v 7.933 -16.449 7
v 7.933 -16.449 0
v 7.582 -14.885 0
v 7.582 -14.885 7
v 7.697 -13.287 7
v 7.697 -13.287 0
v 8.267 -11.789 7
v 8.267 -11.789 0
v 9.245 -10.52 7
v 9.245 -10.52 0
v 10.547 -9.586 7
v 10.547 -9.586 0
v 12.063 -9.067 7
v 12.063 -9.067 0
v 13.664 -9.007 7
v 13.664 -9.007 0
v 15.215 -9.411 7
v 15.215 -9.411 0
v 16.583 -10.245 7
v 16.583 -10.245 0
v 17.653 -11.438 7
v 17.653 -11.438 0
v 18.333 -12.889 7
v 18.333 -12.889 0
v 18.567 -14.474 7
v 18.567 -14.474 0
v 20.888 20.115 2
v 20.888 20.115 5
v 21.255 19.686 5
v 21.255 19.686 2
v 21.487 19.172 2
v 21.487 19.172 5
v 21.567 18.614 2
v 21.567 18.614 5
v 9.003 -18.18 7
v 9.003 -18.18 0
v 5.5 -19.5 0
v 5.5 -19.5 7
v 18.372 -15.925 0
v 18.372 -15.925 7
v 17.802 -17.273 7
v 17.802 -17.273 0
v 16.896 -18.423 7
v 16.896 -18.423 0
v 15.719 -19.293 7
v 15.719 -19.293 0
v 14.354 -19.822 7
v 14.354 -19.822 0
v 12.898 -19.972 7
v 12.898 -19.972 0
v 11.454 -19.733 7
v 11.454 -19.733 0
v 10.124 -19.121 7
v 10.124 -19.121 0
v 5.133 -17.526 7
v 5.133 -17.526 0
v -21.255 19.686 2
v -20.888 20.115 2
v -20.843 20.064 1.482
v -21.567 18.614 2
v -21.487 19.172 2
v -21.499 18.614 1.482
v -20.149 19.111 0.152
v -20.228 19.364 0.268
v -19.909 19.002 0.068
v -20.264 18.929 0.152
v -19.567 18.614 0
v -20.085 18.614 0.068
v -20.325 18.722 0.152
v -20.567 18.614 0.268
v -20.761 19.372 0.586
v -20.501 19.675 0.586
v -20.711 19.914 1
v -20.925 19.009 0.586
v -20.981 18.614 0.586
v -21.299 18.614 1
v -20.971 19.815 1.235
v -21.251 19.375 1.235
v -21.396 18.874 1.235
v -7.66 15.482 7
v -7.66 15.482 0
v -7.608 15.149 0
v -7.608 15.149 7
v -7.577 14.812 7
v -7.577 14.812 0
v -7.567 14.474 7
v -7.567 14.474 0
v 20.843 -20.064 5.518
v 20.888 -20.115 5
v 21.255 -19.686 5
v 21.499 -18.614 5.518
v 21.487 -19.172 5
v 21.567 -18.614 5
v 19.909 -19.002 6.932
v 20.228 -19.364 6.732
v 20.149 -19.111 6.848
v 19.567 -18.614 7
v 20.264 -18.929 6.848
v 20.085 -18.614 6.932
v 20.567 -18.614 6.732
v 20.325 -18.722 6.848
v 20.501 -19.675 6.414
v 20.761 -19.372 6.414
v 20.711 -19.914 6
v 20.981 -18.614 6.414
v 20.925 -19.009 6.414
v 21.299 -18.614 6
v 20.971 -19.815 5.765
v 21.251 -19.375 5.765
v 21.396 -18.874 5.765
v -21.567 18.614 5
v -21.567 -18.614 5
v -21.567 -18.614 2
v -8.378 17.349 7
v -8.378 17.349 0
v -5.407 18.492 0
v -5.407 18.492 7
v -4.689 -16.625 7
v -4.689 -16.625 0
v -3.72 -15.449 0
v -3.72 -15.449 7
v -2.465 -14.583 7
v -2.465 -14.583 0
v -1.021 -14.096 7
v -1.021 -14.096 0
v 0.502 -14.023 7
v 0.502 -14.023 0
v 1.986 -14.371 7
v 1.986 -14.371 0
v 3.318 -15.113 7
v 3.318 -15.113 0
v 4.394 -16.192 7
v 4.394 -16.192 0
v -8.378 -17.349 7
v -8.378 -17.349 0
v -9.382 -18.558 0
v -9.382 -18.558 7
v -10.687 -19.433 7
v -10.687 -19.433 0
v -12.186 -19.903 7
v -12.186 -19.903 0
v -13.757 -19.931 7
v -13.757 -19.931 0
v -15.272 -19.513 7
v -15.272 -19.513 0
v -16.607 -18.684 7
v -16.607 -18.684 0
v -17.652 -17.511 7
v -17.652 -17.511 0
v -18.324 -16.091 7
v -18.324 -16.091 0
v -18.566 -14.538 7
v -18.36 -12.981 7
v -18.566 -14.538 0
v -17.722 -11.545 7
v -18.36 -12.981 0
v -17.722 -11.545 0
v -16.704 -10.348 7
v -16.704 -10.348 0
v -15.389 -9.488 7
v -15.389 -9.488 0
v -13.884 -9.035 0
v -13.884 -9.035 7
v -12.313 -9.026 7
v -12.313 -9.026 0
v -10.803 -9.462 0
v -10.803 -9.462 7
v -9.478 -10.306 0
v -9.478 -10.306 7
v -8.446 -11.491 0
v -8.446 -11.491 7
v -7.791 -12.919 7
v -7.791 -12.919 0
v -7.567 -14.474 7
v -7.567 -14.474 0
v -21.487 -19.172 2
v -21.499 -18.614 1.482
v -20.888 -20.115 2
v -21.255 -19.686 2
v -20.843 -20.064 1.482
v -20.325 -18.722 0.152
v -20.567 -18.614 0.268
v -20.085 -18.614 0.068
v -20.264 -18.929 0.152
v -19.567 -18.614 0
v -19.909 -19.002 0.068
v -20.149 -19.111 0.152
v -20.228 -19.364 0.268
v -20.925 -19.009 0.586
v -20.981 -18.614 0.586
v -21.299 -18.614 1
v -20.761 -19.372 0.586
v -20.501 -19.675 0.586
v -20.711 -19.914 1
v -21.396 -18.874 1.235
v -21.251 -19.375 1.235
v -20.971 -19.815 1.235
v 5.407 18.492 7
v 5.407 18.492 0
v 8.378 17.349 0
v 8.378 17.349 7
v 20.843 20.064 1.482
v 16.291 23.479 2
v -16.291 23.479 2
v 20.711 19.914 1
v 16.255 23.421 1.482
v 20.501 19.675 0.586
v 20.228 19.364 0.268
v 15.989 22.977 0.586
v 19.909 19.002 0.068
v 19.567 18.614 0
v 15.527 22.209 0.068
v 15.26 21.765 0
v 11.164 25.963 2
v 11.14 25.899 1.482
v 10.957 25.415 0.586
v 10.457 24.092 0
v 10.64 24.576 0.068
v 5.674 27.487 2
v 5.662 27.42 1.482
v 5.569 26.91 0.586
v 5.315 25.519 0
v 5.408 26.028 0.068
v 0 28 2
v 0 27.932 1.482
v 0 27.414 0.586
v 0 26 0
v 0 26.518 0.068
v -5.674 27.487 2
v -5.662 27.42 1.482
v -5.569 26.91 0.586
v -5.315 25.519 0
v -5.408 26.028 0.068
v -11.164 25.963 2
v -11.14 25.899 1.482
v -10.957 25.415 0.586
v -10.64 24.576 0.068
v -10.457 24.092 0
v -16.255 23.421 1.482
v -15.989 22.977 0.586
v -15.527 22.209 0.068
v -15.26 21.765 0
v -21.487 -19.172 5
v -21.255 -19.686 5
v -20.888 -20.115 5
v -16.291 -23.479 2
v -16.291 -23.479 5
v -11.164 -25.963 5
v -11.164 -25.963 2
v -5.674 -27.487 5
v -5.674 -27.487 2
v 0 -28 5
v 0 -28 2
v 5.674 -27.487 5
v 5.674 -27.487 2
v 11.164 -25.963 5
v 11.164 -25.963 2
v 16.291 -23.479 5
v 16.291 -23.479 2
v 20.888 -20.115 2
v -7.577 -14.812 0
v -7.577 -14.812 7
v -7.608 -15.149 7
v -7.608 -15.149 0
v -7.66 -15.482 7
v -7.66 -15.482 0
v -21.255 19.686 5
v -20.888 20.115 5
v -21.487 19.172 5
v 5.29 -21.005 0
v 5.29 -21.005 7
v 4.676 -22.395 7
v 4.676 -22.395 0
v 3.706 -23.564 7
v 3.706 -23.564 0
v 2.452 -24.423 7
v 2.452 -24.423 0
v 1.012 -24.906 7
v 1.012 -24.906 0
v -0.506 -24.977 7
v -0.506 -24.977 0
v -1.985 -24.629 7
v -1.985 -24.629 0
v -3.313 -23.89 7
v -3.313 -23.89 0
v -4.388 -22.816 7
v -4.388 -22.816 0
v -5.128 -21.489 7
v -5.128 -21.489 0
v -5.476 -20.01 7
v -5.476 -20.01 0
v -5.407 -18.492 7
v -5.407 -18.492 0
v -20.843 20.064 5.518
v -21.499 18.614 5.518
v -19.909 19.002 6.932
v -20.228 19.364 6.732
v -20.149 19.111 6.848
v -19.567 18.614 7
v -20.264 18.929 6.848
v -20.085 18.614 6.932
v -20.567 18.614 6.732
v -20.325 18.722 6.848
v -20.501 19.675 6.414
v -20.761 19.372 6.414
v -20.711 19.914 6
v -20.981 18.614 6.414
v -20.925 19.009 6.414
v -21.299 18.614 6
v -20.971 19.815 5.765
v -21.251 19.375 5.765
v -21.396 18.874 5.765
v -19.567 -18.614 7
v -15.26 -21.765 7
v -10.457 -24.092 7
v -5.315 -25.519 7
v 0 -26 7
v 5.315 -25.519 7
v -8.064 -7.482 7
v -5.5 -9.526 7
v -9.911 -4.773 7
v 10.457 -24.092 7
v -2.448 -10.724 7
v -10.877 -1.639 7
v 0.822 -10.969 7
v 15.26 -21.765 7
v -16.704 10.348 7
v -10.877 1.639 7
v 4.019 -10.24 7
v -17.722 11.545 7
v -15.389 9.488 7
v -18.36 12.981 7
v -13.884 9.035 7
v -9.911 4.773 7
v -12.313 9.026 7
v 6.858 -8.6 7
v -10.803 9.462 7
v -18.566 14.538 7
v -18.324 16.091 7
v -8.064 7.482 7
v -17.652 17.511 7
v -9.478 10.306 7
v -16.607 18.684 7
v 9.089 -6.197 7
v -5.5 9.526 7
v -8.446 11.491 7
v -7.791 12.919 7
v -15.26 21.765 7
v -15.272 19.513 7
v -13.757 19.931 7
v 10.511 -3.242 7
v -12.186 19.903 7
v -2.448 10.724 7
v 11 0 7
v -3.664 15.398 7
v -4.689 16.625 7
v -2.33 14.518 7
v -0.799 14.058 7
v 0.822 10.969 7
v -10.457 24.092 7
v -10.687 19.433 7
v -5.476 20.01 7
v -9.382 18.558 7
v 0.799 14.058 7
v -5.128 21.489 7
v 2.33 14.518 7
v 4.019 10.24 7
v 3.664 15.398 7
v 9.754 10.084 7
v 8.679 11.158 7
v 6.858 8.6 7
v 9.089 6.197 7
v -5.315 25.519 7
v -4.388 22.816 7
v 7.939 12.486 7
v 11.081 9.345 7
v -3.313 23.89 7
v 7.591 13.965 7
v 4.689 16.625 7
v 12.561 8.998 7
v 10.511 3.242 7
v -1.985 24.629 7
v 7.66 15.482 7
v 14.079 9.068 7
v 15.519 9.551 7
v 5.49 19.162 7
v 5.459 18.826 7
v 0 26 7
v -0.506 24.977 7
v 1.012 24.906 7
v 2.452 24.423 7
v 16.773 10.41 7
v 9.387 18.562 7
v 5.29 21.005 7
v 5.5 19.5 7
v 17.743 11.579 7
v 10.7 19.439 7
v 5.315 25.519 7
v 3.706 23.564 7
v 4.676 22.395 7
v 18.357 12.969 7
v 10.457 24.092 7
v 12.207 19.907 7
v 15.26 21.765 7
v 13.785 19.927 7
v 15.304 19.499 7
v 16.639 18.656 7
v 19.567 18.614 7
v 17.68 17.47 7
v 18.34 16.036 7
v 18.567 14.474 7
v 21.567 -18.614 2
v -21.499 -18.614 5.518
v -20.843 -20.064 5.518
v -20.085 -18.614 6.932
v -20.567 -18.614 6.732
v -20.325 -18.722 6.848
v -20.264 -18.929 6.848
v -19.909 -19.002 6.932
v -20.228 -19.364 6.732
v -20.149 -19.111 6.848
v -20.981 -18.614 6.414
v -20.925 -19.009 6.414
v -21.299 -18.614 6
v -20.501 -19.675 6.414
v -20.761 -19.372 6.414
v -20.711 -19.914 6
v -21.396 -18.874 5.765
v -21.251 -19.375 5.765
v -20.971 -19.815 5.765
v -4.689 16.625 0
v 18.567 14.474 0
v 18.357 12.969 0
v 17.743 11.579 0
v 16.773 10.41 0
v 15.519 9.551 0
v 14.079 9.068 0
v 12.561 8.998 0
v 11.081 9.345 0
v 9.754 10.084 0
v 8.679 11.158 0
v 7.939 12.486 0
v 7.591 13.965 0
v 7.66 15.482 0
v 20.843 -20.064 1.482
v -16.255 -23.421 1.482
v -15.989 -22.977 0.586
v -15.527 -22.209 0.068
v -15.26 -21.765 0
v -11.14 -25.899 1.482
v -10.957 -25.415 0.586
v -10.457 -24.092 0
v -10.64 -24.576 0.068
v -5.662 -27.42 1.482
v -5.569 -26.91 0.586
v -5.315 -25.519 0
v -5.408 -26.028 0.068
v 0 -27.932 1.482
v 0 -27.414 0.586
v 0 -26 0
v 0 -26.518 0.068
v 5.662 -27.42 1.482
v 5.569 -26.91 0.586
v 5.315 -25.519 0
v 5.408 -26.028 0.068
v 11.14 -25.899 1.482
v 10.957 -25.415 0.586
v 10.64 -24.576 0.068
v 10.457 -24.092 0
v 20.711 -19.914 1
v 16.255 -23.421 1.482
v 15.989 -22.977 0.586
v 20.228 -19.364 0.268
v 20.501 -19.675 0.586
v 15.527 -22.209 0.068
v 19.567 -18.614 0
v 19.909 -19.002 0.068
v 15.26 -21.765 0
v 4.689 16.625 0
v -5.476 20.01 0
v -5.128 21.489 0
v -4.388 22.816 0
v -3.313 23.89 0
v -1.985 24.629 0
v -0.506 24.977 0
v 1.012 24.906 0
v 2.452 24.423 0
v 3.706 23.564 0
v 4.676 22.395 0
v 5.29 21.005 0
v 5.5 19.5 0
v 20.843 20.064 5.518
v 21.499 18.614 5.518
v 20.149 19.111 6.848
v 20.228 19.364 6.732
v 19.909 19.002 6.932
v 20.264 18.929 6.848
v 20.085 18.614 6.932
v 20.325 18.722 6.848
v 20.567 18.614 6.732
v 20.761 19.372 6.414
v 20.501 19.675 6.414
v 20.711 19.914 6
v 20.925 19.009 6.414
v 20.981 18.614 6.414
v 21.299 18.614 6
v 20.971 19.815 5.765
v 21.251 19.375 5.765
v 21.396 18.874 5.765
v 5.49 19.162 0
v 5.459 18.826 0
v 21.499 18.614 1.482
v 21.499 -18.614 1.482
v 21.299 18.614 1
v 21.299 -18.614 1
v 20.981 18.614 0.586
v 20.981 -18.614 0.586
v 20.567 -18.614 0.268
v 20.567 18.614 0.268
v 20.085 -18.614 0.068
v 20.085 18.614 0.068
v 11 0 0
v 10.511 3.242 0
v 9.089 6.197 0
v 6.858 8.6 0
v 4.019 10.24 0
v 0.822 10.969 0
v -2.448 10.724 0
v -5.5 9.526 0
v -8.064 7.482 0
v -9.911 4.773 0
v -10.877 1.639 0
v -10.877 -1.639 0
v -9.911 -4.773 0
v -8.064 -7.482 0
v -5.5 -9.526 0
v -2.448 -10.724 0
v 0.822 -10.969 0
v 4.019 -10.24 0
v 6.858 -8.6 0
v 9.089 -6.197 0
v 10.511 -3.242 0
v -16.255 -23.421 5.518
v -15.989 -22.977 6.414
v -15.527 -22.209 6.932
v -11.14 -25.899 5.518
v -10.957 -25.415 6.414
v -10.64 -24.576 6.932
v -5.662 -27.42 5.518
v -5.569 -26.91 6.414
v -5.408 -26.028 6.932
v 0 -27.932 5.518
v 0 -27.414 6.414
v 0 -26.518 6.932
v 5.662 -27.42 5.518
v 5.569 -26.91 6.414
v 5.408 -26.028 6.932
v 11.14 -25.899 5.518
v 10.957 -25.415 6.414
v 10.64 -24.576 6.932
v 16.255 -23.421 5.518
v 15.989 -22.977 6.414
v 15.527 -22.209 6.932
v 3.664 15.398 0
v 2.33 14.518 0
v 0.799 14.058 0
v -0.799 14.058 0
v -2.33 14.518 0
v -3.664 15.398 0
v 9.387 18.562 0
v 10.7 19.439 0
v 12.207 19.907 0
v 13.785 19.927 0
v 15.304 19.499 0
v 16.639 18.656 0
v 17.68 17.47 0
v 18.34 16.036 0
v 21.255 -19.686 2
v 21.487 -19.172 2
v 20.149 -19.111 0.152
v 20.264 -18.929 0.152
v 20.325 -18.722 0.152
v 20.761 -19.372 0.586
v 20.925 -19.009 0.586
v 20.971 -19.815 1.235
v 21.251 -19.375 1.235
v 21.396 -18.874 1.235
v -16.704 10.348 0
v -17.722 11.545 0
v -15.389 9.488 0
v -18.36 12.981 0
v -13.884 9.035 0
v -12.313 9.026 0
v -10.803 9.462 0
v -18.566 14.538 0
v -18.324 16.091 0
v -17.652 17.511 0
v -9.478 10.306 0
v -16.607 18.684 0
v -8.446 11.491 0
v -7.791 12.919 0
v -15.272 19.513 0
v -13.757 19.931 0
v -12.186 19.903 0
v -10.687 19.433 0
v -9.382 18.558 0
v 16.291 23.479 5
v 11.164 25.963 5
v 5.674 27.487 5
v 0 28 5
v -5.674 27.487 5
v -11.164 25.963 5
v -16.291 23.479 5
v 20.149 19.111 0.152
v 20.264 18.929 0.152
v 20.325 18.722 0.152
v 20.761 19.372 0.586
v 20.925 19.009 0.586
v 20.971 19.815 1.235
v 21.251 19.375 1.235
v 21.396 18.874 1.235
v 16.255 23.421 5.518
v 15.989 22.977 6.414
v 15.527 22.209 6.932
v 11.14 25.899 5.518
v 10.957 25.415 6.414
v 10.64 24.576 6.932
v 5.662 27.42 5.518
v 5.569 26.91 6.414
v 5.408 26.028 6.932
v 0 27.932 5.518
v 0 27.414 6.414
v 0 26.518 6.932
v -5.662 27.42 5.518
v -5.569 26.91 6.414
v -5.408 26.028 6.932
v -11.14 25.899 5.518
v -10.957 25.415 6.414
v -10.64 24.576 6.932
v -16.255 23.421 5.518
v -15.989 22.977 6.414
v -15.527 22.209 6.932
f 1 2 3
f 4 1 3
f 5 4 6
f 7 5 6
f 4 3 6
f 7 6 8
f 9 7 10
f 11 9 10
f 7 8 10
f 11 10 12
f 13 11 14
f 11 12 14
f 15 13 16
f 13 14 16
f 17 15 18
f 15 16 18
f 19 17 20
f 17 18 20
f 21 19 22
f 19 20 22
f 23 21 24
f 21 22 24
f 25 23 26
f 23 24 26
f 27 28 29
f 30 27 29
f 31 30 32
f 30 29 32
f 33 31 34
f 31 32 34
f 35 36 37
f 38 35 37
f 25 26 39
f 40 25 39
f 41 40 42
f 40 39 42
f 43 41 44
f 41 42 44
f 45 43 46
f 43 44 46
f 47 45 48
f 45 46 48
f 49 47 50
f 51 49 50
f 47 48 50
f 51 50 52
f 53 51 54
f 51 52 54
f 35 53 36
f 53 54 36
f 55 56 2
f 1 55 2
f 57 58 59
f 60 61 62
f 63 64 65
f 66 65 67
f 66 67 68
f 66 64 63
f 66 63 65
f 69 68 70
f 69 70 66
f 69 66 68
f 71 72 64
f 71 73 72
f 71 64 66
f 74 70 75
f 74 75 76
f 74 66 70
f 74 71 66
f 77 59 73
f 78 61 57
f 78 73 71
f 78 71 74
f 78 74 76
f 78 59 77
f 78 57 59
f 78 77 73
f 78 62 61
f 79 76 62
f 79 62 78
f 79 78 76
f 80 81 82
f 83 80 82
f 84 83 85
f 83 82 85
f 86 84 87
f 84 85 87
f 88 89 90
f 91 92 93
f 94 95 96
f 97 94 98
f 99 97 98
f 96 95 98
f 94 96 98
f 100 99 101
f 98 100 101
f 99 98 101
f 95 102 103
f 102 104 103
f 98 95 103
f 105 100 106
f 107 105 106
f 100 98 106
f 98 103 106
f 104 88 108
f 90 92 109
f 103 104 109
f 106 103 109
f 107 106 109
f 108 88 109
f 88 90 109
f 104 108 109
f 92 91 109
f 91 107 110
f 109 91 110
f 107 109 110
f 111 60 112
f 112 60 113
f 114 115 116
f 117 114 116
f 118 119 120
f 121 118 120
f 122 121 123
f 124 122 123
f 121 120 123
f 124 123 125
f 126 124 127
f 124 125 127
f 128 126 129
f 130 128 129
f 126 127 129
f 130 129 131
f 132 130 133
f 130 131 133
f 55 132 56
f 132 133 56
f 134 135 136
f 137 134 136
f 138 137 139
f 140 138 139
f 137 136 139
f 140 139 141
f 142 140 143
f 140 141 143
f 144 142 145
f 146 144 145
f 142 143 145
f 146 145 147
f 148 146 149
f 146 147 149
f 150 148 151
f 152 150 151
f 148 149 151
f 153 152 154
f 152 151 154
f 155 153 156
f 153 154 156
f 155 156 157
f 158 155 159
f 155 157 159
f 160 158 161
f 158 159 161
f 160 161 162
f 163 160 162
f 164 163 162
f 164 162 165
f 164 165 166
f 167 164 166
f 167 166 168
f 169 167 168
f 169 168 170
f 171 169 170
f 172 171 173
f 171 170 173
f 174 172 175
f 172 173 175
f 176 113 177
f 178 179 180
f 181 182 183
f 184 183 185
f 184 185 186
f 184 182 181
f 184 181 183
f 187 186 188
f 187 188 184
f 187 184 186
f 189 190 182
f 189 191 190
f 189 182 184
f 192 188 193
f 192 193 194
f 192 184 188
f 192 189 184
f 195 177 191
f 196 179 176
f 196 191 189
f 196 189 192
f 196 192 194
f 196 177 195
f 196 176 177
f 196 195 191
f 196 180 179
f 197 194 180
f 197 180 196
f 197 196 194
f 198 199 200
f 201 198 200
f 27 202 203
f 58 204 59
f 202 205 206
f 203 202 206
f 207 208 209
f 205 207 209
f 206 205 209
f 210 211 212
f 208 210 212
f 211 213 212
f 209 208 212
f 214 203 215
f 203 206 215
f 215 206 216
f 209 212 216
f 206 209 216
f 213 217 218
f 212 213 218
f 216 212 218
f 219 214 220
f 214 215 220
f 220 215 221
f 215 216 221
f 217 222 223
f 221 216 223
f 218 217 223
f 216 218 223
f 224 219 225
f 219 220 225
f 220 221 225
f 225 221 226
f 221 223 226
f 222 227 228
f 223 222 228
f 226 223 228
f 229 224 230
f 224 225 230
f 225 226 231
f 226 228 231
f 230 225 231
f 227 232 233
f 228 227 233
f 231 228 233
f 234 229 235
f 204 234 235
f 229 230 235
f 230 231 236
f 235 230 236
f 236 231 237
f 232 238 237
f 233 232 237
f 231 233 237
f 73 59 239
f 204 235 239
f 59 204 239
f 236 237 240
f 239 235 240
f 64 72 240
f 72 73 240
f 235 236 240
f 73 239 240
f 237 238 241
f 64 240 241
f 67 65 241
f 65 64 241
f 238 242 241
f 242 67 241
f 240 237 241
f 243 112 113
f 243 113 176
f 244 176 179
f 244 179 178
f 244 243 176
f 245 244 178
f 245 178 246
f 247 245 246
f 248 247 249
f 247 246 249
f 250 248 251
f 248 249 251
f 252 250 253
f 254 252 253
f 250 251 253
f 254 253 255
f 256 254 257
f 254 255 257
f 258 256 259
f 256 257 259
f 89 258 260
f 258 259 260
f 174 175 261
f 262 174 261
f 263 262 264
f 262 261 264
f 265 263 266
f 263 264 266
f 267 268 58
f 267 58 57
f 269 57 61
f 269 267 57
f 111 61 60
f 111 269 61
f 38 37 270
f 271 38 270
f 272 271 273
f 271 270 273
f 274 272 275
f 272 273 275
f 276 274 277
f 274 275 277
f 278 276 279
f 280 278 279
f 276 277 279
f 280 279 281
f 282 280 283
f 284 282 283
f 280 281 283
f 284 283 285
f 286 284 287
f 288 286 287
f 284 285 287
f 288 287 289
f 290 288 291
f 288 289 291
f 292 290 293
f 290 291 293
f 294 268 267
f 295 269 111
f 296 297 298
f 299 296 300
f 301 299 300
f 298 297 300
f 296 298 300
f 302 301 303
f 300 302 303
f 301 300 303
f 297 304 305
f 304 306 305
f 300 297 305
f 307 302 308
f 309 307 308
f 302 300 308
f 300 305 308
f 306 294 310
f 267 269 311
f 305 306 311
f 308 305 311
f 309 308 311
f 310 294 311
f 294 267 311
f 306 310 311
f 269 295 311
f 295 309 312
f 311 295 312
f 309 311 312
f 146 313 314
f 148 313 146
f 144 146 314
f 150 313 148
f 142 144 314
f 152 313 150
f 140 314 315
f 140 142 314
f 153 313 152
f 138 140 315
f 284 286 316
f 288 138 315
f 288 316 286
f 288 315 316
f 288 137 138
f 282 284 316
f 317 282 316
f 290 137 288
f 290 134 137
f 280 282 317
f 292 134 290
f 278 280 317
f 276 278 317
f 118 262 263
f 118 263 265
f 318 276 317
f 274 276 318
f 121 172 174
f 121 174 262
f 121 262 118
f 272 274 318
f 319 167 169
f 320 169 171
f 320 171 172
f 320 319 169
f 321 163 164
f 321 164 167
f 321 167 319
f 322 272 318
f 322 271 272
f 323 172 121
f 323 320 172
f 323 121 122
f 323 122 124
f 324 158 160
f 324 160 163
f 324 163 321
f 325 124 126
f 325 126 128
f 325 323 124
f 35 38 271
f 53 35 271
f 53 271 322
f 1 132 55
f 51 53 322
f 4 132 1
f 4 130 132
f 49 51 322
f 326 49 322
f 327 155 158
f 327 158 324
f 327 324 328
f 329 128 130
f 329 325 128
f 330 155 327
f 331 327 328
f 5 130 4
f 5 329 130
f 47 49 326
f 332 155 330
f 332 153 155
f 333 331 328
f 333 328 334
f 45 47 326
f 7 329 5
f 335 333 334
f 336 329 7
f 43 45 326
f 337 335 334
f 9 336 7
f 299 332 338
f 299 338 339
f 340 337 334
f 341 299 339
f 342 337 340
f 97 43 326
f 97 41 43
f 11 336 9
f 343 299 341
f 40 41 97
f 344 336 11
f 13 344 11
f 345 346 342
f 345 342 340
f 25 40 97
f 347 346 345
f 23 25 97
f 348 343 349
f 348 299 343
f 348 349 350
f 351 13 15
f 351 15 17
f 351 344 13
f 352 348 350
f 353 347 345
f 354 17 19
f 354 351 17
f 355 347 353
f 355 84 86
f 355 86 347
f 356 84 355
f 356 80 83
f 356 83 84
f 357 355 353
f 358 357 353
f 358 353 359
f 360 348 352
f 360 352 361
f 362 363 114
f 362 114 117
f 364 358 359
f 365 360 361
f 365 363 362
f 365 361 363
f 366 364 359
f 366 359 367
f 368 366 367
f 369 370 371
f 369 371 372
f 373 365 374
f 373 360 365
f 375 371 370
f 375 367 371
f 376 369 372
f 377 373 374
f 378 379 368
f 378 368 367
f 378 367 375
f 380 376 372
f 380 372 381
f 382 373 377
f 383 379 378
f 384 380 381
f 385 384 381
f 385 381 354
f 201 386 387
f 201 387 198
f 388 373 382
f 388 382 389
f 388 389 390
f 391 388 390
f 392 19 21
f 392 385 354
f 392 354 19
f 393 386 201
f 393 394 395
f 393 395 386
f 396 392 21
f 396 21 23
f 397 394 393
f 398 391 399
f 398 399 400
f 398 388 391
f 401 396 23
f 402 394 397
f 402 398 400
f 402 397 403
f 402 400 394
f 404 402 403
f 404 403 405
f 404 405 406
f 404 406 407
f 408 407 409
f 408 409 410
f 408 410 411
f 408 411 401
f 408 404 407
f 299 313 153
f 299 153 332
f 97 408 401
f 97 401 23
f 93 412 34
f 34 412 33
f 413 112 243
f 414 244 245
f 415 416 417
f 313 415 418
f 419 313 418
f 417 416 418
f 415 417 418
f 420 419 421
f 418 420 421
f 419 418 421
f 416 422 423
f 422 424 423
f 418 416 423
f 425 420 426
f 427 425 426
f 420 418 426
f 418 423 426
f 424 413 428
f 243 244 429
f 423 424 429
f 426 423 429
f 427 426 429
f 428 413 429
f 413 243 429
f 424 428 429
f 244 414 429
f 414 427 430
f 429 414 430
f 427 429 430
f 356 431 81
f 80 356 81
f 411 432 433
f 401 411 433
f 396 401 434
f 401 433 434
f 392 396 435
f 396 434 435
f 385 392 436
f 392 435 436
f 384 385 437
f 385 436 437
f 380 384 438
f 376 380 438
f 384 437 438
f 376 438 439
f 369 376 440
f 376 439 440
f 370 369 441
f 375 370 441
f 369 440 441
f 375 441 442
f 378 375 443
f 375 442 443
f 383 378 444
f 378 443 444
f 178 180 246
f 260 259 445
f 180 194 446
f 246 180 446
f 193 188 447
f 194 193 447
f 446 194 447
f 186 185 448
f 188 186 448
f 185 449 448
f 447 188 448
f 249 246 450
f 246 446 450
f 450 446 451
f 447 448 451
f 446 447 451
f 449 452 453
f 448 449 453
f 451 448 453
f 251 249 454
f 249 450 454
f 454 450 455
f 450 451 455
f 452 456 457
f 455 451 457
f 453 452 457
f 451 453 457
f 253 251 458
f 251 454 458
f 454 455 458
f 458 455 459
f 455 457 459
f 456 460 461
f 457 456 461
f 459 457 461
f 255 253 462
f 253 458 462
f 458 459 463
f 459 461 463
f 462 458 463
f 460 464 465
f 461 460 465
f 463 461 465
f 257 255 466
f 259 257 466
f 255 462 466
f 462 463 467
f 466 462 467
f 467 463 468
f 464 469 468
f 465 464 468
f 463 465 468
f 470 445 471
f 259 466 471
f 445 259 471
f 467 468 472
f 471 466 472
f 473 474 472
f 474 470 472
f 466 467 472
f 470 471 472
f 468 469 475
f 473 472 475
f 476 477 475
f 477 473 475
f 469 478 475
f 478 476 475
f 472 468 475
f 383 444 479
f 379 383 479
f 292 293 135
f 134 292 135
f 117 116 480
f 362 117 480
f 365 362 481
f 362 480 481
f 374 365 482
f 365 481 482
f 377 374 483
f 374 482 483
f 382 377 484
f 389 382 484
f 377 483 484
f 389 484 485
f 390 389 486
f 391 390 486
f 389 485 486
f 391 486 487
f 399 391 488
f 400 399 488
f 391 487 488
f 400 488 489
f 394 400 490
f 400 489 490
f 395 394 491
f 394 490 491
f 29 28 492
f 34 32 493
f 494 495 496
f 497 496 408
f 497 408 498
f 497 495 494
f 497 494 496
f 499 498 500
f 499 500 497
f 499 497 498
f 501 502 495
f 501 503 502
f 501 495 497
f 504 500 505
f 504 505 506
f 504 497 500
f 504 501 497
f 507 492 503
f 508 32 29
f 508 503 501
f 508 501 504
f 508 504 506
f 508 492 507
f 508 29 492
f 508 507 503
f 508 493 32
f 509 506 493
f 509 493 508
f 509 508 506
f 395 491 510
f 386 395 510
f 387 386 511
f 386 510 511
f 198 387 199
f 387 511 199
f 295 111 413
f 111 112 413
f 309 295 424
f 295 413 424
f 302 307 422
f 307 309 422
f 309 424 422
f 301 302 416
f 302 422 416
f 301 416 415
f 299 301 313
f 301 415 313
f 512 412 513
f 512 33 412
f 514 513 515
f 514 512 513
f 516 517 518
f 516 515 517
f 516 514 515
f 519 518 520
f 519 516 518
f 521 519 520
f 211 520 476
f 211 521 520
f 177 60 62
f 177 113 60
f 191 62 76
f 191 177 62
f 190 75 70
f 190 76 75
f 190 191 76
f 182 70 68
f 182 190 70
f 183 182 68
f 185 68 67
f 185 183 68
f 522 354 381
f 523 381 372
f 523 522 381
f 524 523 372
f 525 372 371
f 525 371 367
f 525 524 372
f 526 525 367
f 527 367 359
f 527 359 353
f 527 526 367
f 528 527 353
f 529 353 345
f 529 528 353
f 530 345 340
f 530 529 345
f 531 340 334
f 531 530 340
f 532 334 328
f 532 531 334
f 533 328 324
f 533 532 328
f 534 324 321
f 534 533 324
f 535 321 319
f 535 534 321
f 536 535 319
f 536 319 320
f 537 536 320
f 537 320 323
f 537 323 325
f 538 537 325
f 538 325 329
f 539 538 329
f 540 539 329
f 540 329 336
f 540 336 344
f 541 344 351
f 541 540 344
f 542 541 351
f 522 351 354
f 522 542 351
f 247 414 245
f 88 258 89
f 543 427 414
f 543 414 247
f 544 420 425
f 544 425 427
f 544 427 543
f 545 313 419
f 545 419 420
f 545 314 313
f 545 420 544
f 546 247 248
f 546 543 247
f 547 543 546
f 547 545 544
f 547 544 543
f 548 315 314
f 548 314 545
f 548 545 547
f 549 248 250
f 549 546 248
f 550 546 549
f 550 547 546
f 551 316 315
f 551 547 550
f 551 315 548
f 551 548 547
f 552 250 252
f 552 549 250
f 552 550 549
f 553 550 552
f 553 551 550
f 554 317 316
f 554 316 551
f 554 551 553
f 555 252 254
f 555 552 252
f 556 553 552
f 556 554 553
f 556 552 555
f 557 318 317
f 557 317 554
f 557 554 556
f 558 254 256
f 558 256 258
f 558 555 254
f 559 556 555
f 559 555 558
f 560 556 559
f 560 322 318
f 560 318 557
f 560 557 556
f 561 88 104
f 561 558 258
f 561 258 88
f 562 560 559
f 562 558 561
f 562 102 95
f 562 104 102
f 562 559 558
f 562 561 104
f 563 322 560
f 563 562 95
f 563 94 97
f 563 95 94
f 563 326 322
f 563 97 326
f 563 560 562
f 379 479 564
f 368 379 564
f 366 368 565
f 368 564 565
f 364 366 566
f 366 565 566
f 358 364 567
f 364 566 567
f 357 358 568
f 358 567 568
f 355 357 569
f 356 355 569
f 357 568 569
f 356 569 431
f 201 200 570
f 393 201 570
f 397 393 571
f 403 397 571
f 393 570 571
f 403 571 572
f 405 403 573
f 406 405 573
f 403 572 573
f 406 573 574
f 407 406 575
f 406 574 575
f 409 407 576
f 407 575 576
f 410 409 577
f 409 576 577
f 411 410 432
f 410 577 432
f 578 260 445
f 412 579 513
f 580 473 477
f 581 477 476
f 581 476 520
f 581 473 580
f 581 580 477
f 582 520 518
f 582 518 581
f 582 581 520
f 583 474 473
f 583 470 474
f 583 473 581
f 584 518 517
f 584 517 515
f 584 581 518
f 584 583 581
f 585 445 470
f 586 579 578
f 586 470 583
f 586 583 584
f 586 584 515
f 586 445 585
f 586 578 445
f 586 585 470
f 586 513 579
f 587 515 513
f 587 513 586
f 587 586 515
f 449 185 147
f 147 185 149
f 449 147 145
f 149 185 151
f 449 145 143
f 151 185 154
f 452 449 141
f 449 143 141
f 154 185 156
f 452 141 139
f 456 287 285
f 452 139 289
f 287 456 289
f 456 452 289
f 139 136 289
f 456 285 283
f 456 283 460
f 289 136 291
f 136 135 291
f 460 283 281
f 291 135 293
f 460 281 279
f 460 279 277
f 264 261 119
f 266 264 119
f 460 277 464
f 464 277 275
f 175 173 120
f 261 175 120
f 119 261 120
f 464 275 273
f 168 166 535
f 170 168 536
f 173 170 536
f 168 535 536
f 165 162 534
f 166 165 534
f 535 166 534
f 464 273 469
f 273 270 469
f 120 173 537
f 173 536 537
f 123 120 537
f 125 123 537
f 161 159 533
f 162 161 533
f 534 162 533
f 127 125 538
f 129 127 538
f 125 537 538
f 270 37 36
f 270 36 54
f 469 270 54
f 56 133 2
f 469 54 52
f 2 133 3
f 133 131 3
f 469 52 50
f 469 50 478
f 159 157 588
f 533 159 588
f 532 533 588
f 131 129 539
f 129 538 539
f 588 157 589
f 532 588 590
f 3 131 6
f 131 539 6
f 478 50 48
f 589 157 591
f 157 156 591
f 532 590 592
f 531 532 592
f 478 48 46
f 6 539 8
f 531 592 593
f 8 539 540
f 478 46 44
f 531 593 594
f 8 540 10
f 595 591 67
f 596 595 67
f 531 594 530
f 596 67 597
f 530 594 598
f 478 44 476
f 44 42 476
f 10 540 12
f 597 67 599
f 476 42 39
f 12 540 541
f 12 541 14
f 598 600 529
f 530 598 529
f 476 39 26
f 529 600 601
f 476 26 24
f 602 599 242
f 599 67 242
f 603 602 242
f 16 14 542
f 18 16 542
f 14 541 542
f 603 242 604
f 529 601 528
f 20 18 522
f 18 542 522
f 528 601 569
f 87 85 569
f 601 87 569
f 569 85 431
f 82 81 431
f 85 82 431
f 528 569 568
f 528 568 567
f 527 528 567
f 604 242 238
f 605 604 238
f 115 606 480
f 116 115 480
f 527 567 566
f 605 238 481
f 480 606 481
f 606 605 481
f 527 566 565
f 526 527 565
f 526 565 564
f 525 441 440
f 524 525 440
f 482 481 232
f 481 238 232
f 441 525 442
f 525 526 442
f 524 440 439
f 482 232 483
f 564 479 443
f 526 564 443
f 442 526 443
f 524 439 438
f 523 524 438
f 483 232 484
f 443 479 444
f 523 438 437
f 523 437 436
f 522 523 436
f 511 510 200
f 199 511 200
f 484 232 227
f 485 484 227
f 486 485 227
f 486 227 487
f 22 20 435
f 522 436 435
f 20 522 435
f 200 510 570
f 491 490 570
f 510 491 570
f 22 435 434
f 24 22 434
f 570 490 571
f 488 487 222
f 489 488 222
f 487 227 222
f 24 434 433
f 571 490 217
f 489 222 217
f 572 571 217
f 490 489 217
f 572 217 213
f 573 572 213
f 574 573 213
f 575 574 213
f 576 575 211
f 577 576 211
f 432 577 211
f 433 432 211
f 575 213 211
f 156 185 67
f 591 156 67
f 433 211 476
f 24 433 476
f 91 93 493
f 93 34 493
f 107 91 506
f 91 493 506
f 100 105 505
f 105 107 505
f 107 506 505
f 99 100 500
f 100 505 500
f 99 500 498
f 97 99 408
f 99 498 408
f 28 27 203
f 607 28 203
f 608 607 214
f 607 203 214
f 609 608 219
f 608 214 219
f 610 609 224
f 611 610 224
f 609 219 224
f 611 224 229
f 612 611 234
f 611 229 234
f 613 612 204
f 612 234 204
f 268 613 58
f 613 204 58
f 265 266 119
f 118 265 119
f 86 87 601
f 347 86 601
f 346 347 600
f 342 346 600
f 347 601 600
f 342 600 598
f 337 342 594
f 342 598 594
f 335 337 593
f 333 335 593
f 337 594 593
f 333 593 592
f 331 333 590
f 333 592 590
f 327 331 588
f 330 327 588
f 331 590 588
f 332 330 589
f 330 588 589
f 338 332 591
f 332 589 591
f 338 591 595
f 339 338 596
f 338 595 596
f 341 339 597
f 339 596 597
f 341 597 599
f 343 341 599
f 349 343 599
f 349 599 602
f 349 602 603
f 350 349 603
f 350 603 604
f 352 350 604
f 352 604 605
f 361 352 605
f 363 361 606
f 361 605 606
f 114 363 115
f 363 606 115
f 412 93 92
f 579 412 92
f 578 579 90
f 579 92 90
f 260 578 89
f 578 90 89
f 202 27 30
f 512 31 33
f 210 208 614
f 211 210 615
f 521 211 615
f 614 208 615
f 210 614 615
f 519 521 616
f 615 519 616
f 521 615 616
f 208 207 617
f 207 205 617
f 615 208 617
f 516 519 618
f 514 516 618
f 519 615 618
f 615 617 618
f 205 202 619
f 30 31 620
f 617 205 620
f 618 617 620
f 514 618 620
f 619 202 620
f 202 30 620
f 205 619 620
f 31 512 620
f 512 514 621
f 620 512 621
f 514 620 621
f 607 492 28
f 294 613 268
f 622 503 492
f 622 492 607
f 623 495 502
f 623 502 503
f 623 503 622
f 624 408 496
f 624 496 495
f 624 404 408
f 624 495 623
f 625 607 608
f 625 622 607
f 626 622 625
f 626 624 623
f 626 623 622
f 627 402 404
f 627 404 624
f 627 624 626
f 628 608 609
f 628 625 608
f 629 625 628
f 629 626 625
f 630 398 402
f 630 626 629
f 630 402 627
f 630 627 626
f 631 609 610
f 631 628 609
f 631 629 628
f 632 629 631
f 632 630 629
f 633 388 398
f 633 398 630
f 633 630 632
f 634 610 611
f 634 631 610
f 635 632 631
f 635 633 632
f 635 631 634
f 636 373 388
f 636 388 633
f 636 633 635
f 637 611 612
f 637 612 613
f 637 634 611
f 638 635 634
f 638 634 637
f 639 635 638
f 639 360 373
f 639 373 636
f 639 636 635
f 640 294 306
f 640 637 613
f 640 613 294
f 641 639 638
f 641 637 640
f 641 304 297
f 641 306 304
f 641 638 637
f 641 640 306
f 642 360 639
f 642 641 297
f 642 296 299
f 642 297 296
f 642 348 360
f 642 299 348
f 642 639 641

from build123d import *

# Parameters (mm, degrees)
F0_R     = 11
F1_DEPTH = 7
F2_R     = 2


with BuildPart() as f1:
    # F0 (on Top) → F1 (new body)
    with BuildSketch(Plane.XY):
        with BuildLine():
            ThreePointArc((21.566864, 19.5), (0, 28), (-21.566864, 19.5))
            Line((-21.566864, 19.5), (-21.566864, -19.5))
            ThreePointArc((-21.566864, -19.5), (0, -28), (21.566864, -19.5))
            Line((21.566864, -19.5), (21.566864, 19.5))
        make_face()
        with BuildLine():
            ThreePointArc((-8.37799, -17.349157), (-18.3602, -12.98084), (-7.566864, -14.474359))
            ThreePointArc((-7.566864, -14.474359), (-7.590208, -14.980559), (-7.660042, -15.482462))
            Line((-7.660042, -15.482462), (-4.688874, -16.625202))
            ThreePointArc((-4.688874, -16.625202), (0.502097, -14.022966), (5.133411, -17.525641))
            Line((5.133411, -17.525641), (7.933453, -16.448718))
            ThreePointArc((7.933453, -16.448718), (12.062812, -9.066783), (18.566864, -14.474359))
            ThreePointArc((18.566864, -14.474359), (15.05405, -19.602818), (9.00283, -18.18025))
            Line((9.00283, -18.18025), (5.5, -19.5))
            ThreePointArc((5.5, -19.5), (-0.5062, -24.976656), (-5.406822, -18.491897))
            Line((-5.406822, -18.491897), (-8.37799, -17.349157))
        make_face(mode=Mode.SUBTRACT)
        Circle(F0_R, mode=Mode.SUBTRACT)
        with BuildLine():
            ThreePointArc((8.37799, 17.349157), (14.560382, 19.767695), (18.566864, 14.474359))
            ThreePointArc((18.566864, 14.474359), (12.560664, 8.997703), (7.660042, 15.482462))
            Line((7.660042, 15.482462), (4.688874, 16.625202))
            ThreePointArc((4.688874, 16.625202), (0, 14), (-4.688874, 16.625202))
            Line((-4.688874, 16.625202), (-7.660042, 15.482462))
            ThreePointArc((-7.660042, 15.482462), (-7.590208, 14.980559), (-7.566864, 14.474359))
            ThreePointArc((-7.566864, 14.474359), (-18.3602, 12.98084), (-8.37799, 17.349157))
            Line((-8.37799, 17.349157), (-5.406822, 18.491897))
            ThreePointArc((-5.406822, 18.491897), (-0.5062, 24.976656), (5.5, 19.5))
            ThreePointArc((5.5, 19.5), (5.476656, 18.9938), (5.406822, 18.491897))
            Line((5.406822, 18.491897), (8.37799, 17.349157))
        make_face(mode=Mode.SUBTRACT)
    extrude(amount=F1_DEPTH)

    # F2
    f2_edges = [f1.edges().sort_by_distance(p)[0] for p in [
        (21.566864, 19.5, 3.5),
        (-21.566864, 19.5, 3.5),
        (0, 28, 0),
        (0, 28, 7),
        (-21.566864, -19.5, 3.5),
        (-21.566864, 0, 0),
        (-21.566864, 0, 7),
        (21.566864, -19.5, 3.5),
        (0, -28, 0),
        (0, -28, 7),
        (21.566864, 0, 0),
        (21.566864, 0, 7),
    ]]
    fillet(f2_edges, radius=F2_R)


solid = f1.part
